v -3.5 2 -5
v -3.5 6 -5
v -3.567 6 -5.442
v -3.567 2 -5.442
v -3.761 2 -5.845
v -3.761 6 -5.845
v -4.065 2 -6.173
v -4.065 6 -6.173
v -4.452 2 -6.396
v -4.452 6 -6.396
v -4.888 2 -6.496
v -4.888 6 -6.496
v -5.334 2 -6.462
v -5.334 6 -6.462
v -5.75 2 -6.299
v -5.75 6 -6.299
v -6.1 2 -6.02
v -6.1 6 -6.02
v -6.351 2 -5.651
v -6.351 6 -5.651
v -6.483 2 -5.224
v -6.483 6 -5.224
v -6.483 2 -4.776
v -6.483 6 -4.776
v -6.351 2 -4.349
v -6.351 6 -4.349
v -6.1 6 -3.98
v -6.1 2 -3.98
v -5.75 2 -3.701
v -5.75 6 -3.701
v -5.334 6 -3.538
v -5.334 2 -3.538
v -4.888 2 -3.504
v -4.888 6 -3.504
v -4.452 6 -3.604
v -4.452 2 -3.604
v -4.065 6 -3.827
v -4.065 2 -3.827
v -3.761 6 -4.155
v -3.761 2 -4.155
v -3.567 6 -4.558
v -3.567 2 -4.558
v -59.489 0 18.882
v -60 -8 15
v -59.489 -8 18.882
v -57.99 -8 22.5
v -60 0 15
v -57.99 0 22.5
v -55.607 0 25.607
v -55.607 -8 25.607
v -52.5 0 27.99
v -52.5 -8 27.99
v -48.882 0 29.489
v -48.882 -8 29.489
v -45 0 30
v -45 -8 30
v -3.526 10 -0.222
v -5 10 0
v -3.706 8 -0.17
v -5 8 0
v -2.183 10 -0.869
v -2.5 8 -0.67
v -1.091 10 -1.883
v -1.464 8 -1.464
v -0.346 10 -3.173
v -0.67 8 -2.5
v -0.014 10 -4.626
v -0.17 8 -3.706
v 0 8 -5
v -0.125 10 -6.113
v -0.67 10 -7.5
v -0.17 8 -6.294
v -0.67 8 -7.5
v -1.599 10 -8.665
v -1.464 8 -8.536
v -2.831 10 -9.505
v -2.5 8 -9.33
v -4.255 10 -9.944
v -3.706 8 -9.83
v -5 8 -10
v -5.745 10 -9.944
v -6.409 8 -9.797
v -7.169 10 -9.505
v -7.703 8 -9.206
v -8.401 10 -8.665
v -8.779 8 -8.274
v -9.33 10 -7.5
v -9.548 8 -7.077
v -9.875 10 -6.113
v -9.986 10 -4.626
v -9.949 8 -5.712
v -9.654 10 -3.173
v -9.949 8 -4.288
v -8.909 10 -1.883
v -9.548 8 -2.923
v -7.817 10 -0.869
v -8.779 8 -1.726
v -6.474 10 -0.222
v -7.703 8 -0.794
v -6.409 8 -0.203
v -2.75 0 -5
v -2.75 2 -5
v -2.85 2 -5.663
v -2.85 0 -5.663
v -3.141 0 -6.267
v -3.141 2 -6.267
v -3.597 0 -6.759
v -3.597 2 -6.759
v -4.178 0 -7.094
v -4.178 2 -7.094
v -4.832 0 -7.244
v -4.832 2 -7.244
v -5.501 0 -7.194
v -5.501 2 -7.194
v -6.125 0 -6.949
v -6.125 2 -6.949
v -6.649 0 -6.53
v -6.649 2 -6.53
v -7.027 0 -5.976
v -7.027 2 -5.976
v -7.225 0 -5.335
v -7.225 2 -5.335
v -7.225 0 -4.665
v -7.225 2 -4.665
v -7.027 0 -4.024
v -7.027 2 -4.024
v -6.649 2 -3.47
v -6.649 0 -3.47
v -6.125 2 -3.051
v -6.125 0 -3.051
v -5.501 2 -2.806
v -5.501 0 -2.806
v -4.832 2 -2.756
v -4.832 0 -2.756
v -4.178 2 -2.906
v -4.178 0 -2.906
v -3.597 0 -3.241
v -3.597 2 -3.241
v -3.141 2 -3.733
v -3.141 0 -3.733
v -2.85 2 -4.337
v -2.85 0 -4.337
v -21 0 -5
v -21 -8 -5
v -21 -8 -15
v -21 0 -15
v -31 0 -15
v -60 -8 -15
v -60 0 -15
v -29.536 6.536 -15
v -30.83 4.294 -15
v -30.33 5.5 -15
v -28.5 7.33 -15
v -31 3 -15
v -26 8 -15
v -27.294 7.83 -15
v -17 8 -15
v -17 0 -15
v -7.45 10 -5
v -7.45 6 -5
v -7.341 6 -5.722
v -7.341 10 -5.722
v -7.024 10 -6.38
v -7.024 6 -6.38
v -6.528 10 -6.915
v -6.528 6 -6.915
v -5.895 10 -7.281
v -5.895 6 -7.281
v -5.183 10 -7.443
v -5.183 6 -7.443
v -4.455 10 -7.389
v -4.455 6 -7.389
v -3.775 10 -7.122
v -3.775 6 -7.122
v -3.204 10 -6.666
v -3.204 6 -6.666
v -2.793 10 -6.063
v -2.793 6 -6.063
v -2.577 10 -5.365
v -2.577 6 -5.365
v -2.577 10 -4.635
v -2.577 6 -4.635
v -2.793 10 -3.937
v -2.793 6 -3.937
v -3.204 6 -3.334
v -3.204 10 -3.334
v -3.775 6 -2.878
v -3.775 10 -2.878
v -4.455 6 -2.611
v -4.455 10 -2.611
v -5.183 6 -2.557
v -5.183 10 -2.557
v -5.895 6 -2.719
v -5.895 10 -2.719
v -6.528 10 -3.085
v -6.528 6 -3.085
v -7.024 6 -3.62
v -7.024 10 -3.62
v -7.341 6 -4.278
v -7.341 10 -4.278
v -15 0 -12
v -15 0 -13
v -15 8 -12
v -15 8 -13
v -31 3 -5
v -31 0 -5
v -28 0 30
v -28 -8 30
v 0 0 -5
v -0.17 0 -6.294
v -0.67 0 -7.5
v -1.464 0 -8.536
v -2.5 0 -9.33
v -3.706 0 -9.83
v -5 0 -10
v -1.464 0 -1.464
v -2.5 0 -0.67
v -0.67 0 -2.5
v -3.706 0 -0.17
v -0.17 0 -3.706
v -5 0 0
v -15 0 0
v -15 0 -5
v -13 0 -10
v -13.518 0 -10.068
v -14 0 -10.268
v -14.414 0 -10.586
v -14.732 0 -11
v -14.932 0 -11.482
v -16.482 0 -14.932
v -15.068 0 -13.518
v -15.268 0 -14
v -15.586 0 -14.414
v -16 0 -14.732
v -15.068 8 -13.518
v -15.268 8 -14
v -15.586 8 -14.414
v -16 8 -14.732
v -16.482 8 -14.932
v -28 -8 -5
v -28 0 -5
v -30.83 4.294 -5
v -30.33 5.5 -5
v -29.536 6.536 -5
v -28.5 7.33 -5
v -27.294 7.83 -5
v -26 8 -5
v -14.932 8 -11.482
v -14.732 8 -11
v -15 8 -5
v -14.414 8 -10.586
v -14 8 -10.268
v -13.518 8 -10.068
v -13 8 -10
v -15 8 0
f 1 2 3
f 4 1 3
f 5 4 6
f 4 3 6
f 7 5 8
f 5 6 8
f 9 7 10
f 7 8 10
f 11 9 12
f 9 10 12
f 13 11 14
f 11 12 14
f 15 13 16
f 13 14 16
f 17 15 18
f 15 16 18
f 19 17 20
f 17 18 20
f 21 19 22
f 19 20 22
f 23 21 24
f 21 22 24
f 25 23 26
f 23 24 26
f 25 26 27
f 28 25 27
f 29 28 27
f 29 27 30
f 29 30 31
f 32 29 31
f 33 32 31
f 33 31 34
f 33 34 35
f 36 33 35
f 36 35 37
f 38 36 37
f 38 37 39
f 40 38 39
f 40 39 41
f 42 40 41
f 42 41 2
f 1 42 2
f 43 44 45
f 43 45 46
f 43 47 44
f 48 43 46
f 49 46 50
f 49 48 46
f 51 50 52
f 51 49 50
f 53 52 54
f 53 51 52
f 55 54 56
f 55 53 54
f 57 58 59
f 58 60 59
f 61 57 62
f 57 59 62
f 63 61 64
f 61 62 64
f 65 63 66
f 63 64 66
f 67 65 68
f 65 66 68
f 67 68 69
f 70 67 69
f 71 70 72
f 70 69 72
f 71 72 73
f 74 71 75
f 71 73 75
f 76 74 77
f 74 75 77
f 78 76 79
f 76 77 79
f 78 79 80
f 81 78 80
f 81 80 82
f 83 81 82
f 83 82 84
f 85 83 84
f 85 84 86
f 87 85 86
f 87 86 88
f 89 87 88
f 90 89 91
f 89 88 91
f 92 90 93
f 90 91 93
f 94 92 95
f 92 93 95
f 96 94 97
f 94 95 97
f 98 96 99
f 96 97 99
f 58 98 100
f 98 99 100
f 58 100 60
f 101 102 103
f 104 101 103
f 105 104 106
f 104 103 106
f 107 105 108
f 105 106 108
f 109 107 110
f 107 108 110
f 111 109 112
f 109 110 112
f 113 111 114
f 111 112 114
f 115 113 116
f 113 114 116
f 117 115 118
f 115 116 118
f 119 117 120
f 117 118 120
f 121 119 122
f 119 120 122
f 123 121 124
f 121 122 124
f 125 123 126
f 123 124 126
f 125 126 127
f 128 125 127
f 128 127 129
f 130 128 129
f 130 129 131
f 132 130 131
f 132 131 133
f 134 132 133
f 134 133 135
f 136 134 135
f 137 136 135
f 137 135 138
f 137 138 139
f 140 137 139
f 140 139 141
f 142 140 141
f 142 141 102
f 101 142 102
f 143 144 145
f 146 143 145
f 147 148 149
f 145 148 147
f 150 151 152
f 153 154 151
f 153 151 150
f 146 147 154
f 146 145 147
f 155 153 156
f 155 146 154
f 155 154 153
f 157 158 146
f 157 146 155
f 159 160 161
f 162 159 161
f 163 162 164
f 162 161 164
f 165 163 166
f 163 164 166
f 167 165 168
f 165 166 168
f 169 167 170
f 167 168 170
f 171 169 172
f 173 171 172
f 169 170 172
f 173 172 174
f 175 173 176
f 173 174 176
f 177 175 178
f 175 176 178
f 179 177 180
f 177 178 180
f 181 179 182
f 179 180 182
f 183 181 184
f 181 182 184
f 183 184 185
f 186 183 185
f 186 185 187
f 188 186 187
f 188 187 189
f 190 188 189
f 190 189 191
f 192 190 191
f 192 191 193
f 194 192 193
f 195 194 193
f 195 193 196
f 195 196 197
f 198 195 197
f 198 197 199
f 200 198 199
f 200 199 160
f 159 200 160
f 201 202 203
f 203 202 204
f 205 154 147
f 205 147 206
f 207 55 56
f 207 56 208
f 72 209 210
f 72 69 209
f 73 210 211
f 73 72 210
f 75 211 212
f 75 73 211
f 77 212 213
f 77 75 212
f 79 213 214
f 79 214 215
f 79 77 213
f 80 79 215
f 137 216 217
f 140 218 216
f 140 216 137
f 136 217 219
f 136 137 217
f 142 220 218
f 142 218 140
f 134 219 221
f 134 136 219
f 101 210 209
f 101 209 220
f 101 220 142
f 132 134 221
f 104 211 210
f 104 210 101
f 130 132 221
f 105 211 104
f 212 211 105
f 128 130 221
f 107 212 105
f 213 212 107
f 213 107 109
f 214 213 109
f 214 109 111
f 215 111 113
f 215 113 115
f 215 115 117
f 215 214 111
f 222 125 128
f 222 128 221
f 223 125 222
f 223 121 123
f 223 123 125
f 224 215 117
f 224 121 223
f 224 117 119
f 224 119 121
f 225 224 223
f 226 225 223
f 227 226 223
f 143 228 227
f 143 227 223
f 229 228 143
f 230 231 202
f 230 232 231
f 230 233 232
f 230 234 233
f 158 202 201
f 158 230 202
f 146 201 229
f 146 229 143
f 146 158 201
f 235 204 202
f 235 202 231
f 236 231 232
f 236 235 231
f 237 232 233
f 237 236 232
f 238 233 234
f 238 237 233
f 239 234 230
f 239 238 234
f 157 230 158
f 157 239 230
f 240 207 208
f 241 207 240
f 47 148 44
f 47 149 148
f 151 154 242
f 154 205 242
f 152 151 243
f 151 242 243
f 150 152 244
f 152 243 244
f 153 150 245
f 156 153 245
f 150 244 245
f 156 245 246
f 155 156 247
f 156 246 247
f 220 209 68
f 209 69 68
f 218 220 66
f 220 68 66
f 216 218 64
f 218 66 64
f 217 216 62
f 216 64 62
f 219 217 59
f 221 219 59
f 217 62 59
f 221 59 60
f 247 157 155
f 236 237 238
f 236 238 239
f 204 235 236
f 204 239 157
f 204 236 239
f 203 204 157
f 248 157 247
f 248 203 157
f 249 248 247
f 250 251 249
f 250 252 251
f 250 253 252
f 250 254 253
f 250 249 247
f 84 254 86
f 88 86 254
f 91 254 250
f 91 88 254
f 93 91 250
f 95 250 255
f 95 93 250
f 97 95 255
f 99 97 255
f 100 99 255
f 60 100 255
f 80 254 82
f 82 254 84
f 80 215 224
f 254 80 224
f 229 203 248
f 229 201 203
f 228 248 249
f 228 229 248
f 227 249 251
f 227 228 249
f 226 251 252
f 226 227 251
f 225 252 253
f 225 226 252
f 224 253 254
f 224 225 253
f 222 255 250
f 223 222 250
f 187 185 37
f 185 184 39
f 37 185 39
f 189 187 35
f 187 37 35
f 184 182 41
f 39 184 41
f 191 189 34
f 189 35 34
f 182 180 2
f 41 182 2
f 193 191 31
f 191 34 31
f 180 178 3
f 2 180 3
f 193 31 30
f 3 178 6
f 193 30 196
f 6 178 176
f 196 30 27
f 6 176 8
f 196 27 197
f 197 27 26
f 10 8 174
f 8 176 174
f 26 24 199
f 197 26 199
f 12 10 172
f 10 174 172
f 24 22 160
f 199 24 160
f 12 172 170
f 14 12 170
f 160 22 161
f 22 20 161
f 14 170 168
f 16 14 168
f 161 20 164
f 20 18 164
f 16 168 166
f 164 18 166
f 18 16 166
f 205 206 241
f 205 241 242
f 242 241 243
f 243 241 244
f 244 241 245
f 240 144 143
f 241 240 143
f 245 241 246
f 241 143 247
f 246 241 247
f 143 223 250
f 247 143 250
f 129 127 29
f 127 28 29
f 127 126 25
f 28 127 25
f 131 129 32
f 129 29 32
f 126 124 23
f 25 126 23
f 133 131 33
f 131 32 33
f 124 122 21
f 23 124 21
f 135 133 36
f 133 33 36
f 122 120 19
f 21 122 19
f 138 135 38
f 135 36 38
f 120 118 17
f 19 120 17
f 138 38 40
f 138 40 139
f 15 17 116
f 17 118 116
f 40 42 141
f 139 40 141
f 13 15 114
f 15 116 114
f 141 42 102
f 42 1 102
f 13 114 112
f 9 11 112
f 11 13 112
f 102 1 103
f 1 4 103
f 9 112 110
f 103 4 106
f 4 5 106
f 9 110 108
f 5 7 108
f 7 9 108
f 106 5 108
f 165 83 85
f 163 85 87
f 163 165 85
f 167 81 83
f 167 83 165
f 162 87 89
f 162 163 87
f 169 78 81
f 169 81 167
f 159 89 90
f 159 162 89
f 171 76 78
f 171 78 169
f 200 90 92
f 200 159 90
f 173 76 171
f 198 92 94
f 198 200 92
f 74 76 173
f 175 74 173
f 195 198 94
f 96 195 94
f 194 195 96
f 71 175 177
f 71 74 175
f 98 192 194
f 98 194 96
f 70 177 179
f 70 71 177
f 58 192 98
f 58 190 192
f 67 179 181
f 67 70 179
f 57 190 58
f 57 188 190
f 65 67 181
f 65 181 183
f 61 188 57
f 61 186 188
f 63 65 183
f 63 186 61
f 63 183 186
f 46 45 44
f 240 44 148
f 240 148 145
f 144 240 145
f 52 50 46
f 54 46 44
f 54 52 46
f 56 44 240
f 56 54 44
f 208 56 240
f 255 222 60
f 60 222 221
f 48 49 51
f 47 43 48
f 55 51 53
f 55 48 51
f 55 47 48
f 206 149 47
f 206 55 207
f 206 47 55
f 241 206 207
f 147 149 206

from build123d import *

# Parameters (mm, degrees)
EXTRUDE_1_DEPTH      = 8
FILLET_1_R           = 5
SKETCH_5_W           = 10
SKETCH_5_H           = 5
CUT_EXTRUDE_1_DEPTH  = 10
SKETCH_6_W           = 55
SKETCH_6_H           = 5
EXTRUDE_2_DEPTH      = 8
SKETCH_7_R           = 5
EXTRUDE_3_DEPTH      = 2
HOLE_WIZARD_1_D      = 4.9
HOLE_WIZARD_1_DEPTH  = 4
HOLE_WIZARD_2_D      = 3
HOLE_WIZARD_3_D      = 4.5
HOLE_WIZARD_3_DEPTH  = 2
SKETCH_16_W          = 45
SKETCH_16_H          = 10
CUT_EXTRUDE_4_DEPTH  = 82.018516402
SKETCH_17_W          = 45
SKETCH_17_H          = 45
EXTRUDE_4_DEPTH      = 16
SKETCH_20_W          = 45
SKETCH_20_H          = 45
CUT_EXTRUDE_5_DEPTH  = 8
SKETCH_21_W          = 10
SKETCH_21_H          = 16
EXTRUDE_6_DEPTH      = 10
SKETCH_23_W          = 55
SKETCH_23_H          = 45
CUT_EXTRUDE_6_DEPTH  = 8
SKETCH_24_W          = 35
SKETCH_24_H          = 8
CUT_EXTRUDE_7_DEPTH  = 3
FILLET_5_R           = 2
SKETCH_25_W          = 45
SKETCH_25_H          = 8
CUT_EXTRUDE_8_DEPTH  = 10
FILLET_6_R           = 15
SKETCH_27_W          = 6
SKETCH_27_H          = 10
CUT_EXTRUDE_10_DEPTH = 5
SKETCH_28_W          = 6
SKETCH_28_H          = 3
CUT_EXTRUDE_11_DEPTH = 76.663729752
SKETCH_29_W          = 10
SKETCH_29_H          = 8
EXTRUDE_7_DEPTH      = 6
FILLET_7_R           = 5


with BuildPart() as part:
    # 草图1 → 凸台-拉伸1 (new body)
    with BuildSketch(Plane(origin=(0, 0, 0), x_dir=(1, 0, 0), z_dir=(0, 1, 0))):
        Polygon((0, 0), (0, 10), (-70, 10), (-70, -40), (-25, -40), (-25, 0), align=None)
    extrude(amount=EXTRUDE_1_DEPTH)

    # 圆角1
    fillet_1_edges = [part.edges().sort_by_distance(p)[0] for p in [
        (0, 4, 0),
        (0, 4, -10),
    ]]
    fillet(fillet_1_edges, radius=FILLET_1_R - 0.0001)  # a hair under: the kernel refuses the full size

    # 草图5 → 切除-拉伸1 (cut)
    with BuildSketch(Plane(origin=(0, 8, 0), x_dir=(1, 0, 0), z_dir=(0, 1, 0))):
        with Locations((-20, 2.5)):
            Rectangle(SKETCH_5_W, SKETCH_5_H)
    extrude(amount=-CUT_EXTRUDE_1_DEPTH, mode=Mode.SUBTRACT)

    # 草图6 → 凸台-拉伸2 (add)
    with BuildSketch(Plane(origin=(0, 8, 0), x_dir=(1, 0, 0), z_dir=(0, 1, 0))):
        with Locations((-42.5, 12.5)):
            Rectangle(SKETCH_6_W, SKETCH_6_H)
    extrude(amount=-EXTRUDE_2_DEPTH)

    # 草图7 → 凸台-拉伸3 (add)
    with BuildSketch(Plane(origin=(0, 8, 0), x_dir=(1, 0, 0), z_dir=(0, 1, 0))):
        with Locations(Location((-5, 5, 0), (0, 0, 270))):
            Circle(SKETCH_7_R)
    extrude(amount=EXTRUDE_3_DEPTH)

    # 孔1
    with Locations(Plane(origin=(0, 10, 0), x_dir=(1, 0, 0), z_dir=(0, 1, 0))):
        with Locations((-5, 5)):
            Hole(HOLE_WIZARD_1_D / 2, depth=HOLE_WIZARD_1_DEPTH)

    # 孔2 (through all)
    with Locations(Plane(origin=(0, 0, 0), x_dir=(-1, 0, 0), z_dir=(0, -1, 0))):
        with Locations((5, 5)):
            Hole(HOLE_WIZARD_2_D / 2)

    # 孔3
    with Locations(Plane(origin=(0, 0, 0), x_dir=(-1, 0, 0), z_dir=(0, -1, 0))):
        with Locations((5, 5)):
            Hole(HOLE_WIZARD_3_D / 2, depth=HOLE_WIZARD_3_DEPTH)

    # 草图16 → 切除-拉伸4 (cut, through all)
    with BuildSketch(Plane(origin=(0, 8, 0), x_dir=(1, 0, 0), z_dir=(0, 1, 0))):
        with Locations((-47.5, -35)):
            Rectangle(SKETCH_16_W, SKETCH_16_H)
    extrude(amount=-CUT_EXTRUDE_4_DEPTH, mode=Mode.SUBTRACT)

    # 草图17 → 凸台-拉伸4 (add)
    with BuildSketch(Plane.XZ):
        with Locations((-47.5, 7.5)):
            Rectangle(SKETCH_17_W, SKETCH_17_H)
    extrude(amount=EXTRUDE_4_DEPTH)

    # 草图20 → 切除-拉伸5 (cut)
    with BuildSketch(Plane(origin=(0, 8, 0), x_dir=(1, 0, 0), z_dir=(0, 1, 0))):
        with Locations((-47.5, -7.5)):
            Rectangle(SKETCH_20_W, SKETCH_20_H)
    extrude(amount=-CUT_EXTRUDE_5_DEPTH, mode=Mode.SUBTRACT)


with BuildPart() as cut_extrude_5_piece_1:
    # of the separate pieces the step leaves, piece 1, a body of its own (cut_extrude_5_pieces)
    add(part.part.solids().sort_by_distance((-25, 0, 30))[0])



with BuildPart() as cut_extrude_5_piece_2:
    # of the separate pieces the step leaves, piece 2, a body of its own (cut_extrude_5_pieces)
    add(part.part.solids().sort_by_distance((0, 0, -4.9999))[0])


with BuildPart() as cut_extrude_5_piece_1_1:
    add(cut_extrude_5_piece_1.part)

    add(cut_extrude_5_piece_2.part)  # 凸台-拉伸6 merges 切除-拉伸5 piece 2
    # 草图21 → 凸台-拉伸6 (add)
    with BuildSketch(Plane(origin=(0, 0, -15), x_dir=(-1, 0, 0), z_dir=(0, 0, -1))):
        with Locations((20, -8)):
            Rectangle(SKETCH_21_W, SKETCH_21_H)
    extrude(amount=-EXTRUDE_6_DEPTH)

    # 草图23 → 切除-拉伸6 (cut)
    with BuildSketch(Plane.XZ.offset(16)):
        with Locations((-42.5, 7.5)):
            Rectangle(SKETCH_23_W, SKETCH_23_H)
    extrude(amount=-CUT_EXTRUDE_6_DEPTH, mode=Mode.SUBTRACT)

    # 草图24 → 切除-拉伸7 (cut)
    with BuildSketch(Plane(origin=(-25, 0, 0), x_dir=(0, 0, -1), z_dir=(1, 0, 0))):
        with Locations((-12.5, -4)):
            Rectangle(SKETCH_24_W, SKETCH_24_H)
    extrude(amount=-CUT_EXTRUDE_7_DEPTH, mode=Mode.SUBTRACT)

    # 圆角5
    fillet_5_edges = [cut_extrude_5_piece_1_1.edges().sort_by_distance(p)[0] for p in [
        (-15, 0, -15),
        (-15, 4, -10),
    ]]
    fillet(fillet_5_edges, radius=FILLET_5_R)

    # 草图25 → 切除-拉伸8 (cut)
    with BuildSketch(Plane.ZY.offset(70)):
        with Locations((7.5, -4)):
            Rectangle(SKETCH_25_W, SKETCH_25_H)
    extrude(amount=-CUT_EXTRUDE_8_DEPTH, mode=Mode.SUBTRACT)

    # 圆角6
    fillet_6_edges = [cut_extrude_5_piece_1_1.edges().sort_by_distance(p)[0] for p in [
        (-60, -4, 30),
    ]]
    fillet(fillet_6_edges, radius=FILLET_6_R)

    # 草图27 → 切除-拉伸10 (cut)
    with BuildSketch(Plane(origin=(0, -8, 0), x_dir=(-1, 0, 0), z_dir=(0, -1, 0))):
        with Locations((18, 10)):
            Rectangle(SKETCH_27_W, SKETCH_27_H)
    extrude(amount=-CUT_EXTRUDE_10_DEPTH, mode=Mode.SUBTRACT)

    # 草图28 → 切除-拉伸11 (cut, through all)
    with BuildSketch(Plane(origin=(0, 0, -15), x_dir=(-1, 0, 0), z_dir=(0, 0, -1))):
        with Locations((18, -1.5)):
            Rectangle(SKETCH_28_W, SKETCH_28_H)
    extrude(amount=-CUT_EXTRUDE_11_DEPTH, mode=Mode.SUBTRACT)

    # 草图29 → 凸台-拉伸7 (add)
    with BuildSketch(Plane.ZY.offset(25)):
        with Locations((-10, 4)):
            Rectangle(SKETCH_29_W, SKETCH_29_H)
    extrude(amount=EXTRUDE_7_DEPTH)

    # 圆角7
    fillet_7_edges = [cut_extrude_5_piece_1_1.edges().sort_by_distance(p)[0] for p in [
        (-31, 8, -10),
    ]]
    fillet(fillet_7_edges, radius=FILLET_7_R)


solid = cut_extrude_5_piece_1_1.part
